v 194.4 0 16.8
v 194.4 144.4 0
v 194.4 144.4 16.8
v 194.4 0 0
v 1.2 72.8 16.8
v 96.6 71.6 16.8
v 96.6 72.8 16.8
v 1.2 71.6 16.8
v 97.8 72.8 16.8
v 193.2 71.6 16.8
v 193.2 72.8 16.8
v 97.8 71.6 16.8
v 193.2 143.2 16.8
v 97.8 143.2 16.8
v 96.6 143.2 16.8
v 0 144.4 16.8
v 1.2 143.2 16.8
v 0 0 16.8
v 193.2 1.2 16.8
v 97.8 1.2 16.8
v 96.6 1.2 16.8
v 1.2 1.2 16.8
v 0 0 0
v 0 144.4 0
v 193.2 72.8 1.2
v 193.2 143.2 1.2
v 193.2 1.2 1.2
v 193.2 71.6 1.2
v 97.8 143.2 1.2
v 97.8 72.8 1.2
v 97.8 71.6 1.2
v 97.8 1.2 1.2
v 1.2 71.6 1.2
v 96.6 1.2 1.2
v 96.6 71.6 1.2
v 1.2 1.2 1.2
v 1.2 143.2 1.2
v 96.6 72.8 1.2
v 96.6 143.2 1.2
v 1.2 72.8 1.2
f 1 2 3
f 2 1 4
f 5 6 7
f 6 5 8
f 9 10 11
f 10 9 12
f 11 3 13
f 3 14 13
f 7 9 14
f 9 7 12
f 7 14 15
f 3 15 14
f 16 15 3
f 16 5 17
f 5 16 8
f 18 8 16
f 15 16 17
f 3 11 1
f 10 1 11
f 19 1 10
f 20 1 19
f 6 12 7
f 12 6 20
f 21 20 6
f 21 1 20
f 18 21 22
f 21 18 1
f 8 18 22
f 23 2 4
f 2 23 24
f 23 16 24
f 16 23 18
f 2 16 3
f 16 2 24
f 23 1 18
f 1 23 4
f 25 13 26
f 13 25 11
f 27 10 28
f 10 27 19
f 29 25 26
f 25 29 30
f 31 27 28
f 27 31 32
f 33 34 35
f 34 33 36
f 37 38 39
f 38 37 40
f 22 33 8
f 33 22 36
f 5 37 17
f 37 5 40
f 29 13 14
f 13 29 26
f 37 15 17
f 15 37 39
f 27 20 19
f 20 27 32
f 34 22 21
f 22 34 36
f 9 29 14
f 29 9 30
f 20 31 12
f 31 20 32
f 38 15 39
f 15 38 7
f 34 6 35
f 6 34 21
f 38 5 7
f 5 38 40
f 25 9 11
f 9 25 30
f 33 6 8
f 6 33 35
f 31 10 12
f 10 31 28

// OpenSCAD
//-------------------------------------
// Title:             Box MkII
// Version:        1.0.0
// Date:            2019-05-23
// Designer:      Steve Cooper
//-------------------------------------
//
// Tolerance will need to be amended depending on how accurate the printer is and also how tight a fit is required.  Default values work quite well for my setup.

/* [Box Structure] */
// Which one would you like to see?
part = "insert"; // [box:Box Only,lid:Lid Only,insert:Insert only,boxandlid:Box and Lid,All:All 3]
//width of whole main box
x = 200;
//depth of whole main box
y = 150;
//height of whole main box
z = 60;
//thickness of outside edge (needs to be thick enough for lip)
edge = 2;
lipw = edge/2;

/* [Lid Details] */
//height of lip
liph = 10;
//Additional internal height above lip
lidaddheight = 0;
//tolerance of the lip join - this is tolerance on each edge
tol = 0.4;
piecetol = tol /2;  //Apply equal tolerance to lid and box

/* [Compartments] */
//Number of x compartments
comp_x = 2;
//Number of y compartments
comp_y = 2;
//Percentage Height of compartments
comp_perc = 40; //[1:1:100]
//Width of compartment borders
comp_border=1.2;

/* [Insert] */
//Number of x compartments in insert
insert_comp_x = 2;
//Number of y compartments in insert
insert_comp_y = 2;
//Percentage Height of insert compared to base
insert_perc = 30; //[1:1:100]
//Width of insert borders
insert_border=1.2;
//Width of insert dividers
insert_divider=1.2;
//clearance for insert - this is tolerance on each edge
insert_tolerance=0.8;


/* [Hidden] */
//used to give clean rendering
epsilon = 0.01;
//Adjust box to get true whole box dimensions
boxz = z - (edge+lidaddheight);
//Internal x and y dimensions for compartments
intx = x-2*edge;
intstepx = intx / comp_x;
inty = y-2*edge;
intstepy = inty /comp_y;
intz = (boxz-edge)*(comp_perc/100);
//Internals for insert
insertx= intx-2*insert_tolerance;
insertstepx = (insertx-2*insert_border)/insert_comp_x;
inserty= inty-2*insert_tolerance;
insertstepy = (inserty-2*insert_border)/insert_comp_y;
insertz=(boxz-edge)*(insert_perc/100);


module box(){
difference() 
    {
        union()
        {   
            translate(v=[0,0,0]) 
                {
                    cube(size=[x,y,boxz-liph], center=false);
                }
            translate(v=[lipw+piecetol,lipw+piecetol,0]) 
                {
                    cube(size=[x-(2*(lipw+piecetol)),y-(2*(lipw+piecetol)),boxz], center=false);
                }
        }
        translate(v=[edge,edge,edge]) 
            {
                cube(size=[x-(edge*2),y-(edge*2),boxz-edge+epsilon], center=false);
            }
    }
    
    if (comp_x>1){
        for (i=[1:comp_x-1]){
            translate([(intstepx*i)+edge-comp_border/2,edge,edge])
            cube(size=[comp_border,inty,intz]);
        }
        }
    if (comp_y>1){        
        for (i=[1:comp_y-1]){
            translate([edge,(intstepy*i)+edge-comp_border/2,edge])
            cube(size=[intx,comp_border,intz]);
        }
        }        

    
}

module lid(){
difference()
    {
        //main lid
        translate(v=[0,0,0]) 
                {
                    cube(size=[x,y,liph+edge+lidaddheight], center=false);
                }
       //additional height cutout
       translate(v=[edge,edge,edge]) 
            {
                cube(size=[x-(2*edge),y-(2*edge),lidaddheight+epsilon], center=false);
            }                
         //lip cutout   
         translate(v=[edge-lipw-piecetol,edge-lipw-piecetol,edge+lidaddheight]) 
            {
                cube(size=[x-2*(lipw-piecetol),y-2*(lipw-piecetol),liph+epsilon], center=false);
            }
        }
    }
    
    
module insert(){
difference() 
    {
            translate(v=[0,0,0]) 
                {
                    cube(size=[insertx,inserty,insertz], center=false);
                }
        translate(v=[insert_border,insert_border,insert_border]) 
            {
                cube(size=[insertx-(insert_border*2),inserty-(insert_border*2),insertz-insert_border+epsilon], center=false);
            }
    }
    
    if (insert_comp_x>1){
        for (i=[1:insert_comp_x-1]){
            translate([(insertstepx*i)+insert_border-insert_divider/2,insert_border,0])
            cube(size=[insert_divider,inserty-2*insert_border,insertz]);
        }
        }
    if (insert_comp_y>1){        
        for (i=[1:insert_comp_y-1]){
            translate([insert_border,(insertstepy*i)+insert_border-insert_divider/2,0])
            cube(size=[insertx-2*insert_border,insert_divider,insertz]);
        }
        }     
    
}    

module print_part() {
	if (part == "box") {
		box();
	} else if (part == "lid") {
		lid();
	} else if (part == "insert") {
		insert();
    } else if (part == "boxandlid") {
		box();
        translate([0,-y-5,0]) lid();
	} else {  //all
		box();
        translate([0,-y-5,0]) lid();
        translate([x+5,0,0]) insert();
	}
}

print_part();
